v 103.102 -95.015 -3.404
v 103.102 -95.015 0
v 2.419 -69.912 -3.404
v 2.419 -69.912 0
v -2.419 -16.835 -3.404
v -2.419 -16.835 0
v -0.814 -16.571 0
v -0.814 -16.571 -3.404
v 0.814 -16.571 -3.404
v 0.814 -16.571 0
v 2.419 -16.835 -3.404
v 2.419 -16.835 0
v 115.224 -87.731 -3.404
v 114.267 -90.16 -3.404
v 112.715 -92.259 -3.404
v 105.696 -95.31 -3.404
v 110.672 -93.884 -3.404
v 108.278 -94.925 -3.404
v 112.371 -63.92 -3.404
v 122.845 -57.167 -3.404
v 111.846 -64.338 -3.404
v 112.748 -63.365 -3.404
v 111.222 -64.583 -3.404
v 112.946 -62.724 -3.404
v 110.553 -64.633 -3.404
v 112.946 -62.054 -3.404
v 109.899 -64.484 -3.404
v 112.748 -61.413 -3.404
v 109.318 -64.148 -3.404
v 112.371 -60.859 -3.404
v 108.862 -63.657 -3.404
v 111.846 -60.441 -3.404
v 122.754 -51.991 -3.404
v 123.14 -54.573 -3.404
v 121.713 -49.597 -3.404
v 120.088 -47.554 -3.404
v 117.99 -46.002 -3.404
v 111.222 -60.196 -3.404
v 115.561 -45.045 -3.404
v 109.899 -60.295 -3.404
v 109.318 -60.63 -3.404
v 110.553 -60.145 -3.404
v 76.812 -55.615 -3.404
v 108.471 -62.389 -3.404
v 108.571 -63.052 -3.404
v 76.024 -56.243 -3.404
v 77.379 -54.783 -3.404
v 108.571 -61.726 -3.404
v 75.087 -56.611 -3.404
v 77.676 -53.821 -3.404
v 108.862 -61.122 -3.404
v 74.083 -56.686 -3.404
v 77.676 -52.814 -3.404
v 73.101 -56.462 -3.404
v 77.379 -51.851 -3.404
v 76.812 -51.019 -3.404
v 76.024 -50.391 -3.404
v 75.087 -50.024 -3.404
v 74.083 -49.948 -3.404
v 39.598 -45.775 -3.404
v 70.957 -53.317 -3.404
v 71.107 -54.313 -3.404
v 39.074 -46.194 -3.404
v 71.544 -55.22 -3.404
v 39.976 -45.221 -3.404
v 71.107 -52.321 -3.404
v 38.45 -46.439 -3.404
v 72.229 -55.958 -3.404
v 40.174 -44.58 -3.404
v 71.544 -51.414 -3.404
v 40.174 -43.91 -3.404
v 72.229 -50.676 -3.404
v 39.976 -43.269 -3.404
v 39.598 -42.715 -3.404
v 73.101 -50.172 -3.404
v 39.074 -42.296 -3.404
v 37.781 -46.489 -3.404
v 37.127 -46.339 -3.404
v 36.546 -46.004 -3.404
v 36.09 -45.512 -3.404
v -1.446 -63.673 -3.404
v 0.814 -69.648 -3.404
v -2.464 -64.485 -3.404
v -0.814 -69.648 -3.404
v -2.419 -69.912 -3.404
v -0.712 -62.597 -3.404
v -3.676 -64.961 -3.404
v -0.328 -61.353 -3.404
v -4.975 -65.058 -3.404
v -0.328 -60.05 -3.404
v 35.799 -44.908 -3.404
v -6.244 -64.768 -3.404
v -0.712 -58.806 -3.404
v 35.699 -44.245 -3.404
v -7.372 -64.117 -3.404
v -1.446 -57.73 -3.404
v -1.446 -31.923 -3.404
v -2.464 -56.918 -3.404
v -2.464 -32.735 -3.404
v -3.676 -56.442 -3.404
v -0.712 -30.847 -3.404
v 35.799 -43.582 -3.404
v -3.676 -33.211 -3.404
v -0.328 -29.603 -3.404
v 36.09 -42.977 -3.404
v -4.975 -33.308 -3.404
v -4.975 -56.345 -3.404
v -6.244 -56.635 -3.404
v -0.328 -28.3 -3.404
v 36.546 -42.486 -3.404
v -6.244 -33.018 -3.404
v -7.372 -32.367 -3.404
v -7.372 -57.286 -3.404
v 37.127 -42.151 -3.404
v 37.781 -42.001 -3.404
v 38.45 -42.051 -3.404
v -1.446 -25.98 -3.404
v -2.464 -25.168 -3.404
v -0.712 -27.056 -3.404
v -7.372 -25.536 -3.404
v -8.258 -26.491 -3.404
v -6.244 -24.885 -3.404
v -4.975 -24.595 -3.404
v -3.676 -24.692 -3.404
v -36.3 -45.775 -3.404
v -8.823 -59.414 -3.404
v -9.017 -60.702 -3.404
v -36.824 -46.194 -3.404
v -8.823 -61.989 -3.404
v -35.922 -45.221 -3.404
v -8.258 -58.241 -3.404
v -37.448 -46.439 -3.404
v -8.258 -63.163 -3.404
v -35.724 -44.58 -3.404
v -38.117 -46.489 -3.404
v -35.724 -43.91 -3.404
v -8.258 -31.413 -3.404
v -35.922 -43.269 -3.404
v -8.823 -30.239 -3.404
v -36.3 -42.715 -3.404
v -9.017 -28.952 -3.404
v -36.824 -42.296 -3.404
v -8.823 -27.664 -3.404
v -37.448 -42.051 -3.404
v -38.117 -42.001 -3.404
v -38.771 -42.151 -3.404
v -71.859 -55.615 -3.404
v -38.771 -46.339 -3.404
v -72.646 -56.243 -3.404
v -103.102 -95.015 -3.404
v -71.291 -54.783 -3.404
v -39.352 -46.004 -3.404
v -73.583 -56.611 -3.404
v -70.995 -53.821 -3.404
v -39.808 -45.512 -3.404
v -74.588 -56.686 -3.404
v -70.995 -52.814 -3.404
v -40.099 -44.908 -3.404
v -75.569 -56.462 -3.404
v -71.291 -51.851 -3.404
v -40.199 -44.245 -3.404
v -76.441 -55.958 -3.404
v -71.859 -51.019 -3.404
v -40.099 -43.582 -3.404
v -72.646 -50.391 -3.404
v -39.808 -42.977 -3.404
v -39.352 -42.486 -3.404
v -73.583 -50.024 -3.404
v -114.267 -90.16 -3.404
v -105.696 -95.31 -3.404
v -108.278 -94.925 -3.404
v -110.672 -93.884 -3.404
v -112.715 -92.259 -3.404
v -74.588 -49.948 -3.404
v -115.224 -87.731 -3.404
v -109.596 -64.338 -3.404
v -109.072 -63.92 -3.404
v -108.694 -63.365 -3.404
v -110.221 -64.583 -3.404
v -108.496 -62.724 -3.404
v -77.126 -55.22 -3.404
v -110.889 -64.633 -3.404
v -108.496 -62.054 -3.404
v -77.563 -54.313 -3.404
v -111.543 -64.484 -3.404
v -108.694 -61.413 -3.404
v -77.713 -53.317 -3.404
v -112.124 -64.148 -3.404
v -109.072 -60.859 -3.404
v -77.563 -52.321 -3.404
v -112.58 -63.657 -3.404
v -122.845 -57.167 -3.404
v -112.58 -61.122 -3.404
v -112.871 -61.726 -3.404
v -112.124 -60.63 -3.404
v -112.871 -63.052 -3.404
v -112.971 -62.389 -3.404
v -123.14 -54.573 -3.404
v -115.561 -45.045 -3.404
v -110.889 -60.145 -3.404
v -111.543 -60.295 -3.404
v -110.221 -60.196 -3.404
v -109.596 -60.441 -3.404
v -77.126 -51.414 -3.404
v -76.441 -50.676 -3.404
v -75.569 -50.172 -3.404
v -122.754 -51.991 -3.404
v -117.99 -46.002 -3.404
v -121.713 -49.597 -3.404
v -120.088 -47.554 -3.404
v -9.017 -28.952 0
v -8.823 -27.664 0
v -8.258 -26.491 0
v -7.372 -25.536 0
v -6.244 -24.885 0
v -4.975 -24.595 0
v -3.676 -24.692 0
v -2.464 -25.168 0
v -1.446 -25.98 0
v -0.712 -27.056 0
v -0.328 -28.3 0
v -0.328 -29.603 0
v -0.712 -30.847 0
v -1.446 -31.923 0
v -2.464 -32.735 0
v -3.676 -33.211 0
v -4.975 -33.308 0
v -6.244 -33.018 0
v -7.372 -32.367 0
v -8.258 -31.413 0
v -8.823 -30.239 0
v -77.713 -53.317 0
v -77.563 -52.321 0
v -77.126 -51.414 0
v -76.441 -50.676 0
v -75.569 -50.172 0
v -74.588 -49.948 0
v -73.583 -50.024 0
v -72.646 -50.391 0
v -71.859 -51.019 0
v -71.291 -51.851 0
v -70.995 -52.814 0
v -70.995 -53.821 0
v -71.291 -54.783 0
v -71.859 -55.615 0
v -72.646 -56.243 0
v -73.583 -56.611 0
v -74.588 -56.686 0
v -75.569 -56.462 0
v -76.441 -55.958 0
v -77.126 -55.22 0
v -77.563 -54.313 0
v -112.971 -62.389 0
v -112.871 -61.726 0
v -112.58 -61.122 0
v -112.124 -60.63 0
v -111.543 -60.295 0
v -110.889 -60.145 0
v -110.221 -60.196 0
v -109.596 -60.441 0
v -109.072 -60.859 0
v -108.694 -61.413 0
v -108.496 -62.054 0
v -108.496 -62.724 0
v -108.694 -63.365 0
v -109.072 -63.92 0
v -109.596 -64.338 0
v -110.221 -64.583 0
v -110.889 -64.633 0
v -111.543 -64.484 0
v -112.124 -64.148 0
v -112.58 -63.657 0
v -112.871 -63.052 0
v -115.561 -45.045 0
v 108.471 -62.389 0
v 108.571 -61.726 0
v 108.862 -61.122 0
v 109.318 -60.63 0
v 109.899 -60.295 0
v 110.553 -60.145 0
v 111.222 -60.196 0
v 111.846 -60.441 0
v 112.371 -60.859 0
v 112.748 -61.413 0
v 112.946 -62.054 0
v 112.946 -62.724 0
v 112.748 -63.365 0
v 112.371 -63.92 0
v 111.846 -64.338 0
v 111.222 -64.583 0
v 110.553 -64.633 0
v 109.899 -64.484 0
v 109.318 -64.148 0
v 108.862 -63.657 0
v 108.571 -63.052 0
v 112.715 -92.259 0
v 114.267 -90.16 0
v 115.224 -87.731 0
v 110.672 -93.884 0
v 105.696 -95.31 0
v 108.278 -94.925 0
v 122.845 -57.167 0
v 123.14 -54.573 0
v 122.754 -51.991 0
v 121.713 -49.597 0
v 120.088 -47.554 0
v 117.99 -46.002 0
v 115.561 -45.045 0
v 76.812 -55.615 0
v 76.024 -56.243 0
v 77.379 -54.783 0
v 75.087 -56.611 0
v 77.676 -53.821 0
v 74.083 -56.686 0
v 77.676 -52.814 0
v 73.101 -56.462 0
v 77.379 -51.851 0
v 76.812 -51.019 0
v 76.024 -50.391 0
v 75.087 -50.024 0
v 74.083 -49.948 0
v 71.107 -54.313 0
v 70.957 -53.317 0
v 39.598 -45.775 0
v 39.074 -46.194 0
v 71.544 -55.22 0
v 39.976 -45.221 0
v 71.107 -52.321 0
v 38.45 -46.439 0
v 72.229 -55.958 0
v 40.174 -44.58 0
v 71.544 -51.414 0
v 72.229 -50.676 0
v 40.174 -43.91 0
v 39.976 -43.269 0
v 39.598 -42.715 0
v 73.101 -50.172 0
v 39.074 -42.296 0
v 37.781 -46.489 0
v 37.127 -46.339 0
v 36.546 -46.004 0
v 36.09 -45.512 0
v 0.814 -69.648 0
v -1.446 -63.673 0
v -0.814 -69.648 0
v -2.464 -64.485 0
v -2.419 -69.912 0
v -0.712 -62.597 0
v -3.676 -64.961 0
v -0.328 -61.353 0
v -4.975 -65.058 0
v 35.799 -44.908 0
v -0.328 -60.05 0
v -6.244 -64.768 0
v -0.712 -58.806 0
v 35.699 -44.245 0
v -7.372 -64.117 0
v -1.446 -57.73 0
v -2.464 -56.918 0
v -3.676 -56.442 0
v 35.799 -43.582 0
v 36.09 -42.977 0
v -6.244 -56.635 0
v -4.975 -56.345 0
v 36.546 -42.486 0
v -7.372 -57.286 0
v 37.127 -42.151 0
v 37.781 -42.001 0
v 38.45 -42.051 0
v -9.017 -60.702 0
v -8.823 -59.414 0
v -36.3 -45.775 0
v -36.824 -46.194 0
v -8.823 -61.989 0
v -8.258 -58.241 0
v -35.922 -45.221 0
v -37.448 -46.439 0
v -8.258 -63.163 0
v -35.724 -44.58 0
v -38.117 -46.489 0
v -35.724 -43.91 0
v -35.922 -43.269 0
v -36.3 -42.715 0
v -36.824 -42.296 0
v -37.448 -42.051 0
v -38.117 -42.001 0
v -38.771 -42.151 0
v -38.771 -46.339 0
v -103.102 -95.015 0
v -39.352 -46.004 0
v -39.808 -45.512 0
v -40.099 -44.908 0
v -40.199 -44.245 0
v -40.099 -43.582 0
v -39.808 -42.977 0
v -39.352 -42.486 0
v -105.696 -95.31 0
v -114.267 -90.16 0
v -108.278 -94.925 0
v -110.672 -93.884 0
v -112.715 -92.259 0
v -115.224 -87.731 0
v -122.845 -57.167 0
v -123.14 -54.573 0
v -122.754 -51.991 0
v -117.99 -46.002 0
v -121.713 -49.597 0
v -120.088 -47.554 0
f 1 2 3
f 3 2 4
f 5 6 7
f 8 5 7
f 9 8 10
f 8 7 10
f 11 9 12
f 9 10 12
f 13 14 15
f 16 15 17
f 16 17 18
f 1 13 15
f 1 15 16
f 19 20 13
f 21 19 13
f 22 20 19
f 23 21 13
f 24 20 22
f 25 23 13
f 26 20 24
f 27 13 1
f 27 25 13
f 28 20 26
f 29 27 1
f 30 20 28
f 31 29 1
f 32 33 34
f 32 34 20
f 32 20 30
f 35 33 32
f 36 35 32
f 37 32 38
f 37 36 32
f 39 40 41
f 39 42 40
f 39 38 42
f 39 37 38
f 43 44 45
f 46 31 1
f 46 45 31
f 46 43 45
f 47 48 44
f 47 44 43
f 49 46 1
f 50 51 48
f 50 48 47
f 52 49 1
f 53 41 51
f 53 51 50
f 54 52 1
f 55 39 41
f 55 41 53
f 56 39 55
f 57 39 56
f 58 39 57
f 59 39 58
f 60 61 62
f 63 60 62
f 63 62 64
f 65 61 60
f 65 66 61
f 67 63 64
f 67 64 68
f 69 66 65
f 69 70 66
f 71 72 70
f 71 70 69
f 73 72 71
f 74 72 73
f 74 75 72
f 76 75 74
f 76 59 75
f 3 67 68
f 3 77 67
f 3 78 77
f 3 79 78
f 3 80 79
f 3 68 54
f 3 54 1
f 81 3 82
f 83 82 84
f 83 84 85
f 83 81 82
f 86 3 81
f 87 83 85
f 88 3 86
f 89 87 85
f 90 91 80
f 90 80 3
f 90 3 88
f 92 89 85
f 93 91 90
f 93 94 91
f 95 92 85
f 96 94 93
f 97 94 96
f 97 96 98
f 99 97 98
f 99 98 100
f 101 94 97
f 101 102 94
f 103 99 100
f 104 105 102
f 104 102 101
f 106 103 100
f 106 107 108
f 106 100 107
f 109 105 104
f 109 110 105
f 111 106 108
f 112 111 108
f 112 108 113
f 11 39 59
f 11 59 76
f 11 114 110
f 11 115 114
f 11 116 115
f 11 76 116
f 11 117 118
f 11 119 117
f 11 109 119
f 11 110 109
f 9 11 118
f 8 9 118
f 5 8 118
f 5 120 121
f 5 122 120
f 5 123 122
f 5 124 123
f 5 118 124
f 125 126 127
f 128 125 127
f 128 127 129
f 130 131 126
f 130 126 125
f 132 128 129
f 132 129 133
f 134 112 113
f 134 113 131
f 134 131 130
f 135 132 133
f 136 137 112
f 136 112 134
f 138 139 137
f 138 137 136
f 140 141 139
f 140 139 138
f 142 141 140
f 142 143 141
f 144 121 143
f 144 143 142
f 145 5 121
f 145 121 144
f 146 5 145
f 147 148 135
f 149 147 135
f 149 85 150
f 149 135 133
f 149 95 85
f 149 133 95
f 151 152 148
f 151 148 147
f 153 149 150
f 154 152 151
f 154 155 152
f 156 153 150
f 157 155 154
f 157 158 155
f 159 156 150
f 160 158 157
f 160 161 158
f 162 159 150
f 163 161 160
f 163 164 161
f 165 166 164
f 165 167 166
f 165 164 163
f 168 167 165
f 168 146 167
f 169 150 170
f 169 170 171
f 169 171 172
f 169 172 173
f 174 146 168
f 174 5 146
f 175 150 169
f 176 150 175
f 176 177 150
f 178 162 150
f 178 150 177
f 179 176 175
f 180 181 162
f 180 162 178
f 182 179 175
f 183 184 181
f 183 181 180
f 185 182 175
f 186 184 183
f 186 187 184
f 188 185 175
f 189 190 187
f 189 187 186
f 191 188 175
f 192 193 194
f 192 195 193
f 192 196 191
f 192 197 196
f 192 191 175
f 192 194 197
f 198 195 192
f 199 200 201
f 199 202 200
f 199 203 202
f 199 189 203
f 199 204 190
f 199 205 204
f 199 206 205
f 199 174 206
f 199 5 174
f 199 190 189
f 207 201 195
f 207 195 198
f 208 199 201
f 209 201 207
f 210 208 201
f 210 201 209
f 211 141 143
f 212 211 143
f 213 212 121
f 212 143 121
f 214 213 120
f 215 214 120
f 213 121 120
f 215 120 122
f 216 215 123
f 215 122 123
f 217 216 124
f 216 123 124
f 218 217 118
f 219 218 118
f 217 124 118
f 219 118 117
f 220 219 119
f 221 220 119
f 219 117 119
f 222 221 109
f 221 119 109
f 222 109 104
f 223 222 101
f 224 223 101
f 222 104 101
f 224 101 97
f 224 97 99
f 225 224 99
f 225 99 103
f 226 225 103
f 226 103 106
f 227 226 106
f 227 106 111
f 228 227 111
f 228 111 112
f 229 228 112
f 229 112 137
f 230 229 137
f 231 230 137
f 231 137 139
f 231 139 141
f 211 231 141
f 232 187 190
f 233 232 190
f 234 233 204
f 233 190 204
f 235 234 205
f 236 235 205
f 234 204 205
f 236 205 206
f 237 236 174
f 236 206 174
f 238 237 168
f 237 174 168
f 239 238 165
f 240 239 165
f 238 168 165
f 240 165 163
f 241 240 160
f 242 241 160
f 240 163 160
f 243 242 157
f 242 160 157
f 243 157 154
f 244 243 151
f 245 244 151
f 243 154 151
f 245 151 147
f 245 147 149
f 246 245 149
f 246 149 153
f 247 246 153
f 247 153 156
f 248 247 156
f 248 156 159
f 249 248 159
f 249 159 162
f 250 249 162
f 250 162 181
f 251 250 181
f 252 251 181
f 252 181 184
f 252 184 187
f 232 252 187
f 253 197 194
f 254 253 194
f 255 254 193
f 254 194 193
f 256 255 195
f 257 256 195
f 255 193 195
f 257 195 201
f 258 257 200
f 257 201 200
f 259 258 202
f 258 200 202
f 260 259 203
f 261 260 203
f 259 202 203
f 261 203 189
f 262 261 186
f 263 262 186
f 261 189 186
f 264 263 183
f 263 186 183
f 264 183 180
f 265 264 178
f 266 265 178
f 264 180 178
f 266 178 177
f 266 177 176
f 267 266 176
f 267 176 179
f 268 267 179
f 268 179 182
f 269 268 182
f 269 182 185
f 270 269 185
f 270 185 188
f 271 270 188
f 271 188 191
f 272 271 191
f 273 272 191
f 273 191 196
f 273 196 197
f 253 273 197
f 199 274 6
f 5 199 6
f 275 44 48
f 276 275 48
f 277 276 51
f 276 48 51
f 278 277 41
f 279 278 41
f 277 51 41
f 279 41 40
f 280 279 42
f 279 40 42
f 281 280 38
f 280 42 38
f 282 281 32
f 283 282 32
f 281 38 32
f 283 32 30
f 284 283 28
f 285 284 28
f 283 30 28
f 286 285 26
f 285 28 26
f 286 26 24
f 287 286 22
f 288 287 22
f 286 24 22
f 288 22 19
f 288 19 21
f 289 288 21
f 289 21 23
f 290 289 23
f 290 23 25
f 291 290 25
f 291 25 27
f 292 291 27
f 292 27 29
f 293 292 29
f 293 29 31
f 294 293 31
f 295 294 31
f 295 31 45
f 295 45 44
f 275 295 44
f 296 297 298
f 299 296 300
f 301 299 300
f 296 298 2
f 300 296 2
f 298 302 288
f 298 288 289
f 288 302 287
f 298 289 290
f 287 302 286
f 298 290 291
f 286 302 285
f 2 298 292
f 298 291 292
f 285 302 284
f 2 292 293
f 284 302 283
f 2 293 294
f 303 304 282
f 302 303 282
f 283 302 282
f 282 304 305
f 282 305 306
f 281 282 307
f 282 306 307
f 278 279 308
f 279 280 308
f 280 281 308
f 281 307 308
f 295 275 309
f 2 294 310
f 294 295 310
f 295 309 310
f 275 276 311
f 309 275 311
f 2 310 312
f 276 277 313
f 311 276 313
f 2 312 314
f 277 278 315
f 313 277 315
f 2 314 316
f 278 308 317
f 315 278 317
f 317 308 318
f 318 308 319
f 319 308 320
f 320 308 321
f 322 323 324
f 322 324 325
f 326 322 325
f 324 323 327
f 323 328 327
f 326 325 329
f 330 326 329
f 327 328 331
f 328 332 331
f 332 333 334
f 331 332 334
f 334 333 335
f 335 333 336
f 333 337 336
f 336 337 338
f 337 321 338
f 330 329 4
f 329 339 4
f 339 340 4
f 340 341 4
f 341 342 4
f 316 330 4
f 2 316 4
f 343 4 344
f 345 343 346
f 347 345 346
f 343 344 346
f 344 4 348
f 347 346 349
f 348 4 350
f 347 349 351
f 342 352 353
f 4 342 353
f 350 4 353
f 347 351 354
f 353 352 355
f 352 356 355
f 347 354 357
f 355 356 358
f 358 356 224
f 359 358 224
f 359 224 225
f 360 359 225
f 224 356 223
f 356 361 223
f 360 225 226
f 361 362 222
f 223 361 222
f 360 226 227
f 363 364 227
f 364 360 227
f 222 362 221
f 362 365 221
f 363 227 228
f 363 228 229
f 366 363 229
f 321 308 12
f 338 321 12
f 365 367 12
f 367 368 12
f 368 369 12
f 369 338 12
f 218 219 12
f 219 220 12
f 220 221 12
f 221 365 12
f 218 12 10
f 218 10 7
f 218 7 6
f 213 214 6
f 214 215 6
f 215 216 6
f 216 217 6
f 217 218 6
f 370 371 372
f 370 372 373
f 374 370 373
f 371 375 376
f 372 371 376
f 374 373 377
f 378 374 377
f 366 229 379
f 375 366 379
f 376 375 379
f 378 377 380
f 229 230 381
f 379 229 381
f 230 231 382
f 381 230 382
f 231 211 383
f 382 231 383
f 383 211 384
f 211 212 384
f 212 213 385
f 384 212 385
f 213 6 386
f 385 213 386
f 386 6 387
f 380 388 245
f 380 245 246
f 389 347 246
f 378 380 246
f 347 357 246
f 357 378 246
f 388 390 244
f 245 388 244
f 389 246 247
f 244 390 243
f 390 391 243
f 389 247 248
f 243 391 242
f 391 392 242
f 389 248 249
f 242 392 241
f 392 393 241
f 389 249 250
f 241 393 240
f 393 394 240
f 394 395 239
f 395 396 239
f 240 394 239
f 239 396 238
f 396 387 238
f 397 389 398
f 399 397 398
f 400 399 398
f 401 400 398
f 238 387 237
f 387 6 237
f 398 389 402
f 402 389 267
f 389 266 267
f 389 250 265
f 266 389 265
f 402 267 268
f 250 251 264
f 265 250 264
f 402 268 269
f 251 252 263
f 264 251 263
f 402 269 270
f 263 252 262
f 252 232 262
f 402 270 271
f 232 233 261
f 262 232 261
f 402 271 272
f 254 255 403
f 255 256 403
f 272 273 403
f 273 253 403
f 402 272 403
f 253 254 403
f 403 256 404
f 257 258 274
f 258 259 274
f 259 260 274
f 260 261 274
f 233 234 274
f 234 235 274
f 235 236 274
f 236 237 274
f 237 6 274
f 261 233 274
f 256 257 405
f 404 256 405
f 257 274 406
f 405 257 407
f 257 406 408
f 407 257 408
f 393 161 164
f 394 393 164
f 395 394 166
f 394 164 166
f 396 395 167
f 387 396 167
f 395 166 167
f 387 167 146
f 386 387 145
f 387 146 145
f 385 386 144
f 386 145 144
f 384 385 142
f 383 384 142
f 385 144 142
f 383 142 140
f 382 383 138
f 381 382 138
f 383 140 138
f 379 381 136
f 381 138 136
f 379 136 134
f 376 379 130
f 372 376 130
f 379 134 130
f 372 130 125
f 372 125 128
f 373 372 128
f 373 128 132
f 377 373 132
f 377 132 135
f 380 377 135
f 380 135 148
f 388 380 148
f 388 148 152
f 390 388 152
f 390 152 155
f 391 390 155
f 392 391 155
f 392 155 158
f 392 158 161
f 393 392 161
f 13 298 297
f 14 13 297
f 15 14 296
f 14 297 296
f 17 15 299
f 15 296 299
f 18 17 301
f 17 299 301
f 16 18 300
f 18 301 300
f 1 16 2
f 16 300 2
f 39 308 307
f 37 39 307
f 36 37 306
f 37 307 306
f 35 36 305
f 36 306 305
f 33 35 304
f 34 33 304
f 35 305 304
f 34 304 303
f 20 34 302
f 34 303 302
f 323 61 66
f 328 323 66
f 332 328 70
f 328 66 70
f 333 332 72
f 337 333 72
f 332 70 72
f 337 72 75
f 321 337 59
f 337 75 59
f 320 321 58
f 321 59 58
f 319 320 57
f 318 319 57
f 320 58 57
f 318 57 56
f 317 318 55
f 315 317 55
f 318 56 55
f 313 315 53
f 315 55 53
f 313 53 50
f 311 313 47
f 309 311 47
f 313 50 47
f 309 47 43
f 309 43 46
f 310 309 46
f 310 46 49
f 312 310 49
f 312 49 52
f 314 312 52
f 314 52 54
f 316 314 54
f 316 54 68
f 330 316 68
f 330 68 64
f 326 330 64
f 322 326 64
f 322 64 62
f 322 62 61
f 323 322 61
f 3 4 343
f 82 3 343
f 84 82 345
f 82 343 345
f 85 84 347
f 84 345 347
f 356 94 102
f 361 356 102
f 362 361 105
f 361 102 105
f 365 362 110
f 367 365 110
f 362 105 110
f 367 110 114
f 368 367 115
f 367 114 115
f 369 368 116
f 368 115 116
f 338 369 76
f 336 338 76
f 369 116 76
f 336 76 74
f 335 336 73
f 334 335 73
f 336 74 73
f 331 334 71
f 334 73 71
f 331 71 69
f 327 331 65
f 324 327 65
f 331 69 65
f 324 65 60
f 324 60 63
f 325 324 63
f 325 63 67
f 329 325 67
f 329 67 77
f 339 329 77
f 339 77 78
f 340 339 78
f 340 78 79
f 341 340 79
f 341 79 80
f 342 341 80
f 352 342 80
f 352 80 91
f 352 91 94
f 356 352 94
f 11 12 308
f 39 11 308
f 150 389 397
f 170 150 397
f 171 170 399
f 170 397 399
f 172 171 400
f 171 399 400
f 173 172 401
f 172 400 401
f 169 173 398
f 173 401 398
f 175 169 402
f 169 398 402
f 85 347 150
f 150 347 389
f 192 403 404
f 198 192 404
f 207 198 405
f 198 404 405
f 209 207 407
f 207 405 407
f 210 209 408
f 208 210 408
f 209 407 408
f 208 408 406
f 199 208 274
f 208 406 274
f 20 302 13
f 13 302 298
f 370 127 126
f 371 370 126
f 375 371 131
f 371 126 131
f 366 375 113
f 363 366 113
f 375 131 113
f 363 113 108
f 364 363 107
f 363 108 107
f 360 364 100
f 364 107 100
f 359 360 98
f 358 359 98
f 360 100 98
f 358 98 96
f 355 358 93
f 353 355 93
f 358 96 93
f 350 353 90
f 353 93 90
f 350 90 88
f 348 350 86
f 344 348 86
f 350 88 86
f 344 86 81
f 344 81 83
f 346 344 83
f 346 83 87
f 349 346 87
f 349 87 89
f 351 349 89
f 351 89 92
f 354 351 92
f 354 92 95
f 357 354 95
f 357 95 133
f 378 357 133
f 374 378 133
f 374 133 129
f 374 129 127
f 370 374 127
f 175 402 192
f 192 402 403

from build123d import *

# Parameters (mm, degrees)
BOSS_EXTRUDE1_DEPTH             = 3.4036
F_1_4_CLEARANCE_HOLE1_D         = 6.7564
M4_CLEARANCE_HOLE1_D            = 4.5
HOLE_FOR_1_4_300_SC_NUTS_SP_1_D = 8.7376


with BuildPart() as part:
    # Sketch1 → Boss-Extrude1 (new body)
    with BuildSketch(Plane.XY):
        with BuildLine():
            Line((-115.560967743, -45.044749956), (-2.419218956, -16.835343693))
            ThreePointArc((-2.419218956, -16.835343693), (0, -16.538300956), (2.419218956, -16.835343693))
            Line((2.419218956, -16.835343693), (115.560967743, -45.044749956))
            ThreePointArc((115.560967743, -45.044749956), (121.713421794, -49.59732647), (122.84470605, -57.166926175))
            Line((122.84470605, -57.166926175), (115.224166338, -87.731241553))
            ThreePointArc((115.224166338, -87.731241553), (110.671589825, -93.883695604), (103.101990119, -95.014979859))
            Line((103.101990119, -95.014979859), (2.419218956, -69.911945605))
            ThreePointArc((2.419218956, -69.911945605), (0, -69.614902867), (-2.419218956, -69.911945605))
            Line((-2.419218956, -69.911945605), (-103.101990119, -95.014979859))
            ThreePointArc((-103.101990119, -95.014979859), (-110.671589825, -93.883695604), (-115.224166338, -87.731241553))
            Line((-115.224166338, -87.731241553), (-122.84470605, -57.166926175))
            ThreePointArc((-122.84470605, -57.166926175), (-121.713421794, -49.59732647), (-115.560967743, -45.044749956))
        make_face()
    extrude(amount=-BOSS_EXTRUDE1_DEPTH)

    # 1/4 Clearance Hole1 (through all)
    with Locations(Plane.XY):
        with Locations((-74.335136024, -53.317040996), (74.335136024, -53.317040996)):
            Hole(F_1_4_CLEARANCE_HOLE1_D / 2)

    # M4 Clearance Hole1 (through all)
    with Locations(Plane.XY):
        with Locations((-110.721225759, -62.389112081), (-37.949046288, -44.244969911), (37.949046288, -44.244969911), (110.721225759, -62.389112081)):
            Hole(M4_CLEARANCE_HOLE1_D / 2)

    # Hole for 1/4 300® SC Nuts (SP)1 (through all)
    with Locations(Plane.XY):
        with Locations((-4.6482, -60.701560235), (-4.6482, -28.951560235)):
            Hole(HOLE_FOR_1_4_300_SC_NUTS_SP_1_D / 2)


solid = part.part
